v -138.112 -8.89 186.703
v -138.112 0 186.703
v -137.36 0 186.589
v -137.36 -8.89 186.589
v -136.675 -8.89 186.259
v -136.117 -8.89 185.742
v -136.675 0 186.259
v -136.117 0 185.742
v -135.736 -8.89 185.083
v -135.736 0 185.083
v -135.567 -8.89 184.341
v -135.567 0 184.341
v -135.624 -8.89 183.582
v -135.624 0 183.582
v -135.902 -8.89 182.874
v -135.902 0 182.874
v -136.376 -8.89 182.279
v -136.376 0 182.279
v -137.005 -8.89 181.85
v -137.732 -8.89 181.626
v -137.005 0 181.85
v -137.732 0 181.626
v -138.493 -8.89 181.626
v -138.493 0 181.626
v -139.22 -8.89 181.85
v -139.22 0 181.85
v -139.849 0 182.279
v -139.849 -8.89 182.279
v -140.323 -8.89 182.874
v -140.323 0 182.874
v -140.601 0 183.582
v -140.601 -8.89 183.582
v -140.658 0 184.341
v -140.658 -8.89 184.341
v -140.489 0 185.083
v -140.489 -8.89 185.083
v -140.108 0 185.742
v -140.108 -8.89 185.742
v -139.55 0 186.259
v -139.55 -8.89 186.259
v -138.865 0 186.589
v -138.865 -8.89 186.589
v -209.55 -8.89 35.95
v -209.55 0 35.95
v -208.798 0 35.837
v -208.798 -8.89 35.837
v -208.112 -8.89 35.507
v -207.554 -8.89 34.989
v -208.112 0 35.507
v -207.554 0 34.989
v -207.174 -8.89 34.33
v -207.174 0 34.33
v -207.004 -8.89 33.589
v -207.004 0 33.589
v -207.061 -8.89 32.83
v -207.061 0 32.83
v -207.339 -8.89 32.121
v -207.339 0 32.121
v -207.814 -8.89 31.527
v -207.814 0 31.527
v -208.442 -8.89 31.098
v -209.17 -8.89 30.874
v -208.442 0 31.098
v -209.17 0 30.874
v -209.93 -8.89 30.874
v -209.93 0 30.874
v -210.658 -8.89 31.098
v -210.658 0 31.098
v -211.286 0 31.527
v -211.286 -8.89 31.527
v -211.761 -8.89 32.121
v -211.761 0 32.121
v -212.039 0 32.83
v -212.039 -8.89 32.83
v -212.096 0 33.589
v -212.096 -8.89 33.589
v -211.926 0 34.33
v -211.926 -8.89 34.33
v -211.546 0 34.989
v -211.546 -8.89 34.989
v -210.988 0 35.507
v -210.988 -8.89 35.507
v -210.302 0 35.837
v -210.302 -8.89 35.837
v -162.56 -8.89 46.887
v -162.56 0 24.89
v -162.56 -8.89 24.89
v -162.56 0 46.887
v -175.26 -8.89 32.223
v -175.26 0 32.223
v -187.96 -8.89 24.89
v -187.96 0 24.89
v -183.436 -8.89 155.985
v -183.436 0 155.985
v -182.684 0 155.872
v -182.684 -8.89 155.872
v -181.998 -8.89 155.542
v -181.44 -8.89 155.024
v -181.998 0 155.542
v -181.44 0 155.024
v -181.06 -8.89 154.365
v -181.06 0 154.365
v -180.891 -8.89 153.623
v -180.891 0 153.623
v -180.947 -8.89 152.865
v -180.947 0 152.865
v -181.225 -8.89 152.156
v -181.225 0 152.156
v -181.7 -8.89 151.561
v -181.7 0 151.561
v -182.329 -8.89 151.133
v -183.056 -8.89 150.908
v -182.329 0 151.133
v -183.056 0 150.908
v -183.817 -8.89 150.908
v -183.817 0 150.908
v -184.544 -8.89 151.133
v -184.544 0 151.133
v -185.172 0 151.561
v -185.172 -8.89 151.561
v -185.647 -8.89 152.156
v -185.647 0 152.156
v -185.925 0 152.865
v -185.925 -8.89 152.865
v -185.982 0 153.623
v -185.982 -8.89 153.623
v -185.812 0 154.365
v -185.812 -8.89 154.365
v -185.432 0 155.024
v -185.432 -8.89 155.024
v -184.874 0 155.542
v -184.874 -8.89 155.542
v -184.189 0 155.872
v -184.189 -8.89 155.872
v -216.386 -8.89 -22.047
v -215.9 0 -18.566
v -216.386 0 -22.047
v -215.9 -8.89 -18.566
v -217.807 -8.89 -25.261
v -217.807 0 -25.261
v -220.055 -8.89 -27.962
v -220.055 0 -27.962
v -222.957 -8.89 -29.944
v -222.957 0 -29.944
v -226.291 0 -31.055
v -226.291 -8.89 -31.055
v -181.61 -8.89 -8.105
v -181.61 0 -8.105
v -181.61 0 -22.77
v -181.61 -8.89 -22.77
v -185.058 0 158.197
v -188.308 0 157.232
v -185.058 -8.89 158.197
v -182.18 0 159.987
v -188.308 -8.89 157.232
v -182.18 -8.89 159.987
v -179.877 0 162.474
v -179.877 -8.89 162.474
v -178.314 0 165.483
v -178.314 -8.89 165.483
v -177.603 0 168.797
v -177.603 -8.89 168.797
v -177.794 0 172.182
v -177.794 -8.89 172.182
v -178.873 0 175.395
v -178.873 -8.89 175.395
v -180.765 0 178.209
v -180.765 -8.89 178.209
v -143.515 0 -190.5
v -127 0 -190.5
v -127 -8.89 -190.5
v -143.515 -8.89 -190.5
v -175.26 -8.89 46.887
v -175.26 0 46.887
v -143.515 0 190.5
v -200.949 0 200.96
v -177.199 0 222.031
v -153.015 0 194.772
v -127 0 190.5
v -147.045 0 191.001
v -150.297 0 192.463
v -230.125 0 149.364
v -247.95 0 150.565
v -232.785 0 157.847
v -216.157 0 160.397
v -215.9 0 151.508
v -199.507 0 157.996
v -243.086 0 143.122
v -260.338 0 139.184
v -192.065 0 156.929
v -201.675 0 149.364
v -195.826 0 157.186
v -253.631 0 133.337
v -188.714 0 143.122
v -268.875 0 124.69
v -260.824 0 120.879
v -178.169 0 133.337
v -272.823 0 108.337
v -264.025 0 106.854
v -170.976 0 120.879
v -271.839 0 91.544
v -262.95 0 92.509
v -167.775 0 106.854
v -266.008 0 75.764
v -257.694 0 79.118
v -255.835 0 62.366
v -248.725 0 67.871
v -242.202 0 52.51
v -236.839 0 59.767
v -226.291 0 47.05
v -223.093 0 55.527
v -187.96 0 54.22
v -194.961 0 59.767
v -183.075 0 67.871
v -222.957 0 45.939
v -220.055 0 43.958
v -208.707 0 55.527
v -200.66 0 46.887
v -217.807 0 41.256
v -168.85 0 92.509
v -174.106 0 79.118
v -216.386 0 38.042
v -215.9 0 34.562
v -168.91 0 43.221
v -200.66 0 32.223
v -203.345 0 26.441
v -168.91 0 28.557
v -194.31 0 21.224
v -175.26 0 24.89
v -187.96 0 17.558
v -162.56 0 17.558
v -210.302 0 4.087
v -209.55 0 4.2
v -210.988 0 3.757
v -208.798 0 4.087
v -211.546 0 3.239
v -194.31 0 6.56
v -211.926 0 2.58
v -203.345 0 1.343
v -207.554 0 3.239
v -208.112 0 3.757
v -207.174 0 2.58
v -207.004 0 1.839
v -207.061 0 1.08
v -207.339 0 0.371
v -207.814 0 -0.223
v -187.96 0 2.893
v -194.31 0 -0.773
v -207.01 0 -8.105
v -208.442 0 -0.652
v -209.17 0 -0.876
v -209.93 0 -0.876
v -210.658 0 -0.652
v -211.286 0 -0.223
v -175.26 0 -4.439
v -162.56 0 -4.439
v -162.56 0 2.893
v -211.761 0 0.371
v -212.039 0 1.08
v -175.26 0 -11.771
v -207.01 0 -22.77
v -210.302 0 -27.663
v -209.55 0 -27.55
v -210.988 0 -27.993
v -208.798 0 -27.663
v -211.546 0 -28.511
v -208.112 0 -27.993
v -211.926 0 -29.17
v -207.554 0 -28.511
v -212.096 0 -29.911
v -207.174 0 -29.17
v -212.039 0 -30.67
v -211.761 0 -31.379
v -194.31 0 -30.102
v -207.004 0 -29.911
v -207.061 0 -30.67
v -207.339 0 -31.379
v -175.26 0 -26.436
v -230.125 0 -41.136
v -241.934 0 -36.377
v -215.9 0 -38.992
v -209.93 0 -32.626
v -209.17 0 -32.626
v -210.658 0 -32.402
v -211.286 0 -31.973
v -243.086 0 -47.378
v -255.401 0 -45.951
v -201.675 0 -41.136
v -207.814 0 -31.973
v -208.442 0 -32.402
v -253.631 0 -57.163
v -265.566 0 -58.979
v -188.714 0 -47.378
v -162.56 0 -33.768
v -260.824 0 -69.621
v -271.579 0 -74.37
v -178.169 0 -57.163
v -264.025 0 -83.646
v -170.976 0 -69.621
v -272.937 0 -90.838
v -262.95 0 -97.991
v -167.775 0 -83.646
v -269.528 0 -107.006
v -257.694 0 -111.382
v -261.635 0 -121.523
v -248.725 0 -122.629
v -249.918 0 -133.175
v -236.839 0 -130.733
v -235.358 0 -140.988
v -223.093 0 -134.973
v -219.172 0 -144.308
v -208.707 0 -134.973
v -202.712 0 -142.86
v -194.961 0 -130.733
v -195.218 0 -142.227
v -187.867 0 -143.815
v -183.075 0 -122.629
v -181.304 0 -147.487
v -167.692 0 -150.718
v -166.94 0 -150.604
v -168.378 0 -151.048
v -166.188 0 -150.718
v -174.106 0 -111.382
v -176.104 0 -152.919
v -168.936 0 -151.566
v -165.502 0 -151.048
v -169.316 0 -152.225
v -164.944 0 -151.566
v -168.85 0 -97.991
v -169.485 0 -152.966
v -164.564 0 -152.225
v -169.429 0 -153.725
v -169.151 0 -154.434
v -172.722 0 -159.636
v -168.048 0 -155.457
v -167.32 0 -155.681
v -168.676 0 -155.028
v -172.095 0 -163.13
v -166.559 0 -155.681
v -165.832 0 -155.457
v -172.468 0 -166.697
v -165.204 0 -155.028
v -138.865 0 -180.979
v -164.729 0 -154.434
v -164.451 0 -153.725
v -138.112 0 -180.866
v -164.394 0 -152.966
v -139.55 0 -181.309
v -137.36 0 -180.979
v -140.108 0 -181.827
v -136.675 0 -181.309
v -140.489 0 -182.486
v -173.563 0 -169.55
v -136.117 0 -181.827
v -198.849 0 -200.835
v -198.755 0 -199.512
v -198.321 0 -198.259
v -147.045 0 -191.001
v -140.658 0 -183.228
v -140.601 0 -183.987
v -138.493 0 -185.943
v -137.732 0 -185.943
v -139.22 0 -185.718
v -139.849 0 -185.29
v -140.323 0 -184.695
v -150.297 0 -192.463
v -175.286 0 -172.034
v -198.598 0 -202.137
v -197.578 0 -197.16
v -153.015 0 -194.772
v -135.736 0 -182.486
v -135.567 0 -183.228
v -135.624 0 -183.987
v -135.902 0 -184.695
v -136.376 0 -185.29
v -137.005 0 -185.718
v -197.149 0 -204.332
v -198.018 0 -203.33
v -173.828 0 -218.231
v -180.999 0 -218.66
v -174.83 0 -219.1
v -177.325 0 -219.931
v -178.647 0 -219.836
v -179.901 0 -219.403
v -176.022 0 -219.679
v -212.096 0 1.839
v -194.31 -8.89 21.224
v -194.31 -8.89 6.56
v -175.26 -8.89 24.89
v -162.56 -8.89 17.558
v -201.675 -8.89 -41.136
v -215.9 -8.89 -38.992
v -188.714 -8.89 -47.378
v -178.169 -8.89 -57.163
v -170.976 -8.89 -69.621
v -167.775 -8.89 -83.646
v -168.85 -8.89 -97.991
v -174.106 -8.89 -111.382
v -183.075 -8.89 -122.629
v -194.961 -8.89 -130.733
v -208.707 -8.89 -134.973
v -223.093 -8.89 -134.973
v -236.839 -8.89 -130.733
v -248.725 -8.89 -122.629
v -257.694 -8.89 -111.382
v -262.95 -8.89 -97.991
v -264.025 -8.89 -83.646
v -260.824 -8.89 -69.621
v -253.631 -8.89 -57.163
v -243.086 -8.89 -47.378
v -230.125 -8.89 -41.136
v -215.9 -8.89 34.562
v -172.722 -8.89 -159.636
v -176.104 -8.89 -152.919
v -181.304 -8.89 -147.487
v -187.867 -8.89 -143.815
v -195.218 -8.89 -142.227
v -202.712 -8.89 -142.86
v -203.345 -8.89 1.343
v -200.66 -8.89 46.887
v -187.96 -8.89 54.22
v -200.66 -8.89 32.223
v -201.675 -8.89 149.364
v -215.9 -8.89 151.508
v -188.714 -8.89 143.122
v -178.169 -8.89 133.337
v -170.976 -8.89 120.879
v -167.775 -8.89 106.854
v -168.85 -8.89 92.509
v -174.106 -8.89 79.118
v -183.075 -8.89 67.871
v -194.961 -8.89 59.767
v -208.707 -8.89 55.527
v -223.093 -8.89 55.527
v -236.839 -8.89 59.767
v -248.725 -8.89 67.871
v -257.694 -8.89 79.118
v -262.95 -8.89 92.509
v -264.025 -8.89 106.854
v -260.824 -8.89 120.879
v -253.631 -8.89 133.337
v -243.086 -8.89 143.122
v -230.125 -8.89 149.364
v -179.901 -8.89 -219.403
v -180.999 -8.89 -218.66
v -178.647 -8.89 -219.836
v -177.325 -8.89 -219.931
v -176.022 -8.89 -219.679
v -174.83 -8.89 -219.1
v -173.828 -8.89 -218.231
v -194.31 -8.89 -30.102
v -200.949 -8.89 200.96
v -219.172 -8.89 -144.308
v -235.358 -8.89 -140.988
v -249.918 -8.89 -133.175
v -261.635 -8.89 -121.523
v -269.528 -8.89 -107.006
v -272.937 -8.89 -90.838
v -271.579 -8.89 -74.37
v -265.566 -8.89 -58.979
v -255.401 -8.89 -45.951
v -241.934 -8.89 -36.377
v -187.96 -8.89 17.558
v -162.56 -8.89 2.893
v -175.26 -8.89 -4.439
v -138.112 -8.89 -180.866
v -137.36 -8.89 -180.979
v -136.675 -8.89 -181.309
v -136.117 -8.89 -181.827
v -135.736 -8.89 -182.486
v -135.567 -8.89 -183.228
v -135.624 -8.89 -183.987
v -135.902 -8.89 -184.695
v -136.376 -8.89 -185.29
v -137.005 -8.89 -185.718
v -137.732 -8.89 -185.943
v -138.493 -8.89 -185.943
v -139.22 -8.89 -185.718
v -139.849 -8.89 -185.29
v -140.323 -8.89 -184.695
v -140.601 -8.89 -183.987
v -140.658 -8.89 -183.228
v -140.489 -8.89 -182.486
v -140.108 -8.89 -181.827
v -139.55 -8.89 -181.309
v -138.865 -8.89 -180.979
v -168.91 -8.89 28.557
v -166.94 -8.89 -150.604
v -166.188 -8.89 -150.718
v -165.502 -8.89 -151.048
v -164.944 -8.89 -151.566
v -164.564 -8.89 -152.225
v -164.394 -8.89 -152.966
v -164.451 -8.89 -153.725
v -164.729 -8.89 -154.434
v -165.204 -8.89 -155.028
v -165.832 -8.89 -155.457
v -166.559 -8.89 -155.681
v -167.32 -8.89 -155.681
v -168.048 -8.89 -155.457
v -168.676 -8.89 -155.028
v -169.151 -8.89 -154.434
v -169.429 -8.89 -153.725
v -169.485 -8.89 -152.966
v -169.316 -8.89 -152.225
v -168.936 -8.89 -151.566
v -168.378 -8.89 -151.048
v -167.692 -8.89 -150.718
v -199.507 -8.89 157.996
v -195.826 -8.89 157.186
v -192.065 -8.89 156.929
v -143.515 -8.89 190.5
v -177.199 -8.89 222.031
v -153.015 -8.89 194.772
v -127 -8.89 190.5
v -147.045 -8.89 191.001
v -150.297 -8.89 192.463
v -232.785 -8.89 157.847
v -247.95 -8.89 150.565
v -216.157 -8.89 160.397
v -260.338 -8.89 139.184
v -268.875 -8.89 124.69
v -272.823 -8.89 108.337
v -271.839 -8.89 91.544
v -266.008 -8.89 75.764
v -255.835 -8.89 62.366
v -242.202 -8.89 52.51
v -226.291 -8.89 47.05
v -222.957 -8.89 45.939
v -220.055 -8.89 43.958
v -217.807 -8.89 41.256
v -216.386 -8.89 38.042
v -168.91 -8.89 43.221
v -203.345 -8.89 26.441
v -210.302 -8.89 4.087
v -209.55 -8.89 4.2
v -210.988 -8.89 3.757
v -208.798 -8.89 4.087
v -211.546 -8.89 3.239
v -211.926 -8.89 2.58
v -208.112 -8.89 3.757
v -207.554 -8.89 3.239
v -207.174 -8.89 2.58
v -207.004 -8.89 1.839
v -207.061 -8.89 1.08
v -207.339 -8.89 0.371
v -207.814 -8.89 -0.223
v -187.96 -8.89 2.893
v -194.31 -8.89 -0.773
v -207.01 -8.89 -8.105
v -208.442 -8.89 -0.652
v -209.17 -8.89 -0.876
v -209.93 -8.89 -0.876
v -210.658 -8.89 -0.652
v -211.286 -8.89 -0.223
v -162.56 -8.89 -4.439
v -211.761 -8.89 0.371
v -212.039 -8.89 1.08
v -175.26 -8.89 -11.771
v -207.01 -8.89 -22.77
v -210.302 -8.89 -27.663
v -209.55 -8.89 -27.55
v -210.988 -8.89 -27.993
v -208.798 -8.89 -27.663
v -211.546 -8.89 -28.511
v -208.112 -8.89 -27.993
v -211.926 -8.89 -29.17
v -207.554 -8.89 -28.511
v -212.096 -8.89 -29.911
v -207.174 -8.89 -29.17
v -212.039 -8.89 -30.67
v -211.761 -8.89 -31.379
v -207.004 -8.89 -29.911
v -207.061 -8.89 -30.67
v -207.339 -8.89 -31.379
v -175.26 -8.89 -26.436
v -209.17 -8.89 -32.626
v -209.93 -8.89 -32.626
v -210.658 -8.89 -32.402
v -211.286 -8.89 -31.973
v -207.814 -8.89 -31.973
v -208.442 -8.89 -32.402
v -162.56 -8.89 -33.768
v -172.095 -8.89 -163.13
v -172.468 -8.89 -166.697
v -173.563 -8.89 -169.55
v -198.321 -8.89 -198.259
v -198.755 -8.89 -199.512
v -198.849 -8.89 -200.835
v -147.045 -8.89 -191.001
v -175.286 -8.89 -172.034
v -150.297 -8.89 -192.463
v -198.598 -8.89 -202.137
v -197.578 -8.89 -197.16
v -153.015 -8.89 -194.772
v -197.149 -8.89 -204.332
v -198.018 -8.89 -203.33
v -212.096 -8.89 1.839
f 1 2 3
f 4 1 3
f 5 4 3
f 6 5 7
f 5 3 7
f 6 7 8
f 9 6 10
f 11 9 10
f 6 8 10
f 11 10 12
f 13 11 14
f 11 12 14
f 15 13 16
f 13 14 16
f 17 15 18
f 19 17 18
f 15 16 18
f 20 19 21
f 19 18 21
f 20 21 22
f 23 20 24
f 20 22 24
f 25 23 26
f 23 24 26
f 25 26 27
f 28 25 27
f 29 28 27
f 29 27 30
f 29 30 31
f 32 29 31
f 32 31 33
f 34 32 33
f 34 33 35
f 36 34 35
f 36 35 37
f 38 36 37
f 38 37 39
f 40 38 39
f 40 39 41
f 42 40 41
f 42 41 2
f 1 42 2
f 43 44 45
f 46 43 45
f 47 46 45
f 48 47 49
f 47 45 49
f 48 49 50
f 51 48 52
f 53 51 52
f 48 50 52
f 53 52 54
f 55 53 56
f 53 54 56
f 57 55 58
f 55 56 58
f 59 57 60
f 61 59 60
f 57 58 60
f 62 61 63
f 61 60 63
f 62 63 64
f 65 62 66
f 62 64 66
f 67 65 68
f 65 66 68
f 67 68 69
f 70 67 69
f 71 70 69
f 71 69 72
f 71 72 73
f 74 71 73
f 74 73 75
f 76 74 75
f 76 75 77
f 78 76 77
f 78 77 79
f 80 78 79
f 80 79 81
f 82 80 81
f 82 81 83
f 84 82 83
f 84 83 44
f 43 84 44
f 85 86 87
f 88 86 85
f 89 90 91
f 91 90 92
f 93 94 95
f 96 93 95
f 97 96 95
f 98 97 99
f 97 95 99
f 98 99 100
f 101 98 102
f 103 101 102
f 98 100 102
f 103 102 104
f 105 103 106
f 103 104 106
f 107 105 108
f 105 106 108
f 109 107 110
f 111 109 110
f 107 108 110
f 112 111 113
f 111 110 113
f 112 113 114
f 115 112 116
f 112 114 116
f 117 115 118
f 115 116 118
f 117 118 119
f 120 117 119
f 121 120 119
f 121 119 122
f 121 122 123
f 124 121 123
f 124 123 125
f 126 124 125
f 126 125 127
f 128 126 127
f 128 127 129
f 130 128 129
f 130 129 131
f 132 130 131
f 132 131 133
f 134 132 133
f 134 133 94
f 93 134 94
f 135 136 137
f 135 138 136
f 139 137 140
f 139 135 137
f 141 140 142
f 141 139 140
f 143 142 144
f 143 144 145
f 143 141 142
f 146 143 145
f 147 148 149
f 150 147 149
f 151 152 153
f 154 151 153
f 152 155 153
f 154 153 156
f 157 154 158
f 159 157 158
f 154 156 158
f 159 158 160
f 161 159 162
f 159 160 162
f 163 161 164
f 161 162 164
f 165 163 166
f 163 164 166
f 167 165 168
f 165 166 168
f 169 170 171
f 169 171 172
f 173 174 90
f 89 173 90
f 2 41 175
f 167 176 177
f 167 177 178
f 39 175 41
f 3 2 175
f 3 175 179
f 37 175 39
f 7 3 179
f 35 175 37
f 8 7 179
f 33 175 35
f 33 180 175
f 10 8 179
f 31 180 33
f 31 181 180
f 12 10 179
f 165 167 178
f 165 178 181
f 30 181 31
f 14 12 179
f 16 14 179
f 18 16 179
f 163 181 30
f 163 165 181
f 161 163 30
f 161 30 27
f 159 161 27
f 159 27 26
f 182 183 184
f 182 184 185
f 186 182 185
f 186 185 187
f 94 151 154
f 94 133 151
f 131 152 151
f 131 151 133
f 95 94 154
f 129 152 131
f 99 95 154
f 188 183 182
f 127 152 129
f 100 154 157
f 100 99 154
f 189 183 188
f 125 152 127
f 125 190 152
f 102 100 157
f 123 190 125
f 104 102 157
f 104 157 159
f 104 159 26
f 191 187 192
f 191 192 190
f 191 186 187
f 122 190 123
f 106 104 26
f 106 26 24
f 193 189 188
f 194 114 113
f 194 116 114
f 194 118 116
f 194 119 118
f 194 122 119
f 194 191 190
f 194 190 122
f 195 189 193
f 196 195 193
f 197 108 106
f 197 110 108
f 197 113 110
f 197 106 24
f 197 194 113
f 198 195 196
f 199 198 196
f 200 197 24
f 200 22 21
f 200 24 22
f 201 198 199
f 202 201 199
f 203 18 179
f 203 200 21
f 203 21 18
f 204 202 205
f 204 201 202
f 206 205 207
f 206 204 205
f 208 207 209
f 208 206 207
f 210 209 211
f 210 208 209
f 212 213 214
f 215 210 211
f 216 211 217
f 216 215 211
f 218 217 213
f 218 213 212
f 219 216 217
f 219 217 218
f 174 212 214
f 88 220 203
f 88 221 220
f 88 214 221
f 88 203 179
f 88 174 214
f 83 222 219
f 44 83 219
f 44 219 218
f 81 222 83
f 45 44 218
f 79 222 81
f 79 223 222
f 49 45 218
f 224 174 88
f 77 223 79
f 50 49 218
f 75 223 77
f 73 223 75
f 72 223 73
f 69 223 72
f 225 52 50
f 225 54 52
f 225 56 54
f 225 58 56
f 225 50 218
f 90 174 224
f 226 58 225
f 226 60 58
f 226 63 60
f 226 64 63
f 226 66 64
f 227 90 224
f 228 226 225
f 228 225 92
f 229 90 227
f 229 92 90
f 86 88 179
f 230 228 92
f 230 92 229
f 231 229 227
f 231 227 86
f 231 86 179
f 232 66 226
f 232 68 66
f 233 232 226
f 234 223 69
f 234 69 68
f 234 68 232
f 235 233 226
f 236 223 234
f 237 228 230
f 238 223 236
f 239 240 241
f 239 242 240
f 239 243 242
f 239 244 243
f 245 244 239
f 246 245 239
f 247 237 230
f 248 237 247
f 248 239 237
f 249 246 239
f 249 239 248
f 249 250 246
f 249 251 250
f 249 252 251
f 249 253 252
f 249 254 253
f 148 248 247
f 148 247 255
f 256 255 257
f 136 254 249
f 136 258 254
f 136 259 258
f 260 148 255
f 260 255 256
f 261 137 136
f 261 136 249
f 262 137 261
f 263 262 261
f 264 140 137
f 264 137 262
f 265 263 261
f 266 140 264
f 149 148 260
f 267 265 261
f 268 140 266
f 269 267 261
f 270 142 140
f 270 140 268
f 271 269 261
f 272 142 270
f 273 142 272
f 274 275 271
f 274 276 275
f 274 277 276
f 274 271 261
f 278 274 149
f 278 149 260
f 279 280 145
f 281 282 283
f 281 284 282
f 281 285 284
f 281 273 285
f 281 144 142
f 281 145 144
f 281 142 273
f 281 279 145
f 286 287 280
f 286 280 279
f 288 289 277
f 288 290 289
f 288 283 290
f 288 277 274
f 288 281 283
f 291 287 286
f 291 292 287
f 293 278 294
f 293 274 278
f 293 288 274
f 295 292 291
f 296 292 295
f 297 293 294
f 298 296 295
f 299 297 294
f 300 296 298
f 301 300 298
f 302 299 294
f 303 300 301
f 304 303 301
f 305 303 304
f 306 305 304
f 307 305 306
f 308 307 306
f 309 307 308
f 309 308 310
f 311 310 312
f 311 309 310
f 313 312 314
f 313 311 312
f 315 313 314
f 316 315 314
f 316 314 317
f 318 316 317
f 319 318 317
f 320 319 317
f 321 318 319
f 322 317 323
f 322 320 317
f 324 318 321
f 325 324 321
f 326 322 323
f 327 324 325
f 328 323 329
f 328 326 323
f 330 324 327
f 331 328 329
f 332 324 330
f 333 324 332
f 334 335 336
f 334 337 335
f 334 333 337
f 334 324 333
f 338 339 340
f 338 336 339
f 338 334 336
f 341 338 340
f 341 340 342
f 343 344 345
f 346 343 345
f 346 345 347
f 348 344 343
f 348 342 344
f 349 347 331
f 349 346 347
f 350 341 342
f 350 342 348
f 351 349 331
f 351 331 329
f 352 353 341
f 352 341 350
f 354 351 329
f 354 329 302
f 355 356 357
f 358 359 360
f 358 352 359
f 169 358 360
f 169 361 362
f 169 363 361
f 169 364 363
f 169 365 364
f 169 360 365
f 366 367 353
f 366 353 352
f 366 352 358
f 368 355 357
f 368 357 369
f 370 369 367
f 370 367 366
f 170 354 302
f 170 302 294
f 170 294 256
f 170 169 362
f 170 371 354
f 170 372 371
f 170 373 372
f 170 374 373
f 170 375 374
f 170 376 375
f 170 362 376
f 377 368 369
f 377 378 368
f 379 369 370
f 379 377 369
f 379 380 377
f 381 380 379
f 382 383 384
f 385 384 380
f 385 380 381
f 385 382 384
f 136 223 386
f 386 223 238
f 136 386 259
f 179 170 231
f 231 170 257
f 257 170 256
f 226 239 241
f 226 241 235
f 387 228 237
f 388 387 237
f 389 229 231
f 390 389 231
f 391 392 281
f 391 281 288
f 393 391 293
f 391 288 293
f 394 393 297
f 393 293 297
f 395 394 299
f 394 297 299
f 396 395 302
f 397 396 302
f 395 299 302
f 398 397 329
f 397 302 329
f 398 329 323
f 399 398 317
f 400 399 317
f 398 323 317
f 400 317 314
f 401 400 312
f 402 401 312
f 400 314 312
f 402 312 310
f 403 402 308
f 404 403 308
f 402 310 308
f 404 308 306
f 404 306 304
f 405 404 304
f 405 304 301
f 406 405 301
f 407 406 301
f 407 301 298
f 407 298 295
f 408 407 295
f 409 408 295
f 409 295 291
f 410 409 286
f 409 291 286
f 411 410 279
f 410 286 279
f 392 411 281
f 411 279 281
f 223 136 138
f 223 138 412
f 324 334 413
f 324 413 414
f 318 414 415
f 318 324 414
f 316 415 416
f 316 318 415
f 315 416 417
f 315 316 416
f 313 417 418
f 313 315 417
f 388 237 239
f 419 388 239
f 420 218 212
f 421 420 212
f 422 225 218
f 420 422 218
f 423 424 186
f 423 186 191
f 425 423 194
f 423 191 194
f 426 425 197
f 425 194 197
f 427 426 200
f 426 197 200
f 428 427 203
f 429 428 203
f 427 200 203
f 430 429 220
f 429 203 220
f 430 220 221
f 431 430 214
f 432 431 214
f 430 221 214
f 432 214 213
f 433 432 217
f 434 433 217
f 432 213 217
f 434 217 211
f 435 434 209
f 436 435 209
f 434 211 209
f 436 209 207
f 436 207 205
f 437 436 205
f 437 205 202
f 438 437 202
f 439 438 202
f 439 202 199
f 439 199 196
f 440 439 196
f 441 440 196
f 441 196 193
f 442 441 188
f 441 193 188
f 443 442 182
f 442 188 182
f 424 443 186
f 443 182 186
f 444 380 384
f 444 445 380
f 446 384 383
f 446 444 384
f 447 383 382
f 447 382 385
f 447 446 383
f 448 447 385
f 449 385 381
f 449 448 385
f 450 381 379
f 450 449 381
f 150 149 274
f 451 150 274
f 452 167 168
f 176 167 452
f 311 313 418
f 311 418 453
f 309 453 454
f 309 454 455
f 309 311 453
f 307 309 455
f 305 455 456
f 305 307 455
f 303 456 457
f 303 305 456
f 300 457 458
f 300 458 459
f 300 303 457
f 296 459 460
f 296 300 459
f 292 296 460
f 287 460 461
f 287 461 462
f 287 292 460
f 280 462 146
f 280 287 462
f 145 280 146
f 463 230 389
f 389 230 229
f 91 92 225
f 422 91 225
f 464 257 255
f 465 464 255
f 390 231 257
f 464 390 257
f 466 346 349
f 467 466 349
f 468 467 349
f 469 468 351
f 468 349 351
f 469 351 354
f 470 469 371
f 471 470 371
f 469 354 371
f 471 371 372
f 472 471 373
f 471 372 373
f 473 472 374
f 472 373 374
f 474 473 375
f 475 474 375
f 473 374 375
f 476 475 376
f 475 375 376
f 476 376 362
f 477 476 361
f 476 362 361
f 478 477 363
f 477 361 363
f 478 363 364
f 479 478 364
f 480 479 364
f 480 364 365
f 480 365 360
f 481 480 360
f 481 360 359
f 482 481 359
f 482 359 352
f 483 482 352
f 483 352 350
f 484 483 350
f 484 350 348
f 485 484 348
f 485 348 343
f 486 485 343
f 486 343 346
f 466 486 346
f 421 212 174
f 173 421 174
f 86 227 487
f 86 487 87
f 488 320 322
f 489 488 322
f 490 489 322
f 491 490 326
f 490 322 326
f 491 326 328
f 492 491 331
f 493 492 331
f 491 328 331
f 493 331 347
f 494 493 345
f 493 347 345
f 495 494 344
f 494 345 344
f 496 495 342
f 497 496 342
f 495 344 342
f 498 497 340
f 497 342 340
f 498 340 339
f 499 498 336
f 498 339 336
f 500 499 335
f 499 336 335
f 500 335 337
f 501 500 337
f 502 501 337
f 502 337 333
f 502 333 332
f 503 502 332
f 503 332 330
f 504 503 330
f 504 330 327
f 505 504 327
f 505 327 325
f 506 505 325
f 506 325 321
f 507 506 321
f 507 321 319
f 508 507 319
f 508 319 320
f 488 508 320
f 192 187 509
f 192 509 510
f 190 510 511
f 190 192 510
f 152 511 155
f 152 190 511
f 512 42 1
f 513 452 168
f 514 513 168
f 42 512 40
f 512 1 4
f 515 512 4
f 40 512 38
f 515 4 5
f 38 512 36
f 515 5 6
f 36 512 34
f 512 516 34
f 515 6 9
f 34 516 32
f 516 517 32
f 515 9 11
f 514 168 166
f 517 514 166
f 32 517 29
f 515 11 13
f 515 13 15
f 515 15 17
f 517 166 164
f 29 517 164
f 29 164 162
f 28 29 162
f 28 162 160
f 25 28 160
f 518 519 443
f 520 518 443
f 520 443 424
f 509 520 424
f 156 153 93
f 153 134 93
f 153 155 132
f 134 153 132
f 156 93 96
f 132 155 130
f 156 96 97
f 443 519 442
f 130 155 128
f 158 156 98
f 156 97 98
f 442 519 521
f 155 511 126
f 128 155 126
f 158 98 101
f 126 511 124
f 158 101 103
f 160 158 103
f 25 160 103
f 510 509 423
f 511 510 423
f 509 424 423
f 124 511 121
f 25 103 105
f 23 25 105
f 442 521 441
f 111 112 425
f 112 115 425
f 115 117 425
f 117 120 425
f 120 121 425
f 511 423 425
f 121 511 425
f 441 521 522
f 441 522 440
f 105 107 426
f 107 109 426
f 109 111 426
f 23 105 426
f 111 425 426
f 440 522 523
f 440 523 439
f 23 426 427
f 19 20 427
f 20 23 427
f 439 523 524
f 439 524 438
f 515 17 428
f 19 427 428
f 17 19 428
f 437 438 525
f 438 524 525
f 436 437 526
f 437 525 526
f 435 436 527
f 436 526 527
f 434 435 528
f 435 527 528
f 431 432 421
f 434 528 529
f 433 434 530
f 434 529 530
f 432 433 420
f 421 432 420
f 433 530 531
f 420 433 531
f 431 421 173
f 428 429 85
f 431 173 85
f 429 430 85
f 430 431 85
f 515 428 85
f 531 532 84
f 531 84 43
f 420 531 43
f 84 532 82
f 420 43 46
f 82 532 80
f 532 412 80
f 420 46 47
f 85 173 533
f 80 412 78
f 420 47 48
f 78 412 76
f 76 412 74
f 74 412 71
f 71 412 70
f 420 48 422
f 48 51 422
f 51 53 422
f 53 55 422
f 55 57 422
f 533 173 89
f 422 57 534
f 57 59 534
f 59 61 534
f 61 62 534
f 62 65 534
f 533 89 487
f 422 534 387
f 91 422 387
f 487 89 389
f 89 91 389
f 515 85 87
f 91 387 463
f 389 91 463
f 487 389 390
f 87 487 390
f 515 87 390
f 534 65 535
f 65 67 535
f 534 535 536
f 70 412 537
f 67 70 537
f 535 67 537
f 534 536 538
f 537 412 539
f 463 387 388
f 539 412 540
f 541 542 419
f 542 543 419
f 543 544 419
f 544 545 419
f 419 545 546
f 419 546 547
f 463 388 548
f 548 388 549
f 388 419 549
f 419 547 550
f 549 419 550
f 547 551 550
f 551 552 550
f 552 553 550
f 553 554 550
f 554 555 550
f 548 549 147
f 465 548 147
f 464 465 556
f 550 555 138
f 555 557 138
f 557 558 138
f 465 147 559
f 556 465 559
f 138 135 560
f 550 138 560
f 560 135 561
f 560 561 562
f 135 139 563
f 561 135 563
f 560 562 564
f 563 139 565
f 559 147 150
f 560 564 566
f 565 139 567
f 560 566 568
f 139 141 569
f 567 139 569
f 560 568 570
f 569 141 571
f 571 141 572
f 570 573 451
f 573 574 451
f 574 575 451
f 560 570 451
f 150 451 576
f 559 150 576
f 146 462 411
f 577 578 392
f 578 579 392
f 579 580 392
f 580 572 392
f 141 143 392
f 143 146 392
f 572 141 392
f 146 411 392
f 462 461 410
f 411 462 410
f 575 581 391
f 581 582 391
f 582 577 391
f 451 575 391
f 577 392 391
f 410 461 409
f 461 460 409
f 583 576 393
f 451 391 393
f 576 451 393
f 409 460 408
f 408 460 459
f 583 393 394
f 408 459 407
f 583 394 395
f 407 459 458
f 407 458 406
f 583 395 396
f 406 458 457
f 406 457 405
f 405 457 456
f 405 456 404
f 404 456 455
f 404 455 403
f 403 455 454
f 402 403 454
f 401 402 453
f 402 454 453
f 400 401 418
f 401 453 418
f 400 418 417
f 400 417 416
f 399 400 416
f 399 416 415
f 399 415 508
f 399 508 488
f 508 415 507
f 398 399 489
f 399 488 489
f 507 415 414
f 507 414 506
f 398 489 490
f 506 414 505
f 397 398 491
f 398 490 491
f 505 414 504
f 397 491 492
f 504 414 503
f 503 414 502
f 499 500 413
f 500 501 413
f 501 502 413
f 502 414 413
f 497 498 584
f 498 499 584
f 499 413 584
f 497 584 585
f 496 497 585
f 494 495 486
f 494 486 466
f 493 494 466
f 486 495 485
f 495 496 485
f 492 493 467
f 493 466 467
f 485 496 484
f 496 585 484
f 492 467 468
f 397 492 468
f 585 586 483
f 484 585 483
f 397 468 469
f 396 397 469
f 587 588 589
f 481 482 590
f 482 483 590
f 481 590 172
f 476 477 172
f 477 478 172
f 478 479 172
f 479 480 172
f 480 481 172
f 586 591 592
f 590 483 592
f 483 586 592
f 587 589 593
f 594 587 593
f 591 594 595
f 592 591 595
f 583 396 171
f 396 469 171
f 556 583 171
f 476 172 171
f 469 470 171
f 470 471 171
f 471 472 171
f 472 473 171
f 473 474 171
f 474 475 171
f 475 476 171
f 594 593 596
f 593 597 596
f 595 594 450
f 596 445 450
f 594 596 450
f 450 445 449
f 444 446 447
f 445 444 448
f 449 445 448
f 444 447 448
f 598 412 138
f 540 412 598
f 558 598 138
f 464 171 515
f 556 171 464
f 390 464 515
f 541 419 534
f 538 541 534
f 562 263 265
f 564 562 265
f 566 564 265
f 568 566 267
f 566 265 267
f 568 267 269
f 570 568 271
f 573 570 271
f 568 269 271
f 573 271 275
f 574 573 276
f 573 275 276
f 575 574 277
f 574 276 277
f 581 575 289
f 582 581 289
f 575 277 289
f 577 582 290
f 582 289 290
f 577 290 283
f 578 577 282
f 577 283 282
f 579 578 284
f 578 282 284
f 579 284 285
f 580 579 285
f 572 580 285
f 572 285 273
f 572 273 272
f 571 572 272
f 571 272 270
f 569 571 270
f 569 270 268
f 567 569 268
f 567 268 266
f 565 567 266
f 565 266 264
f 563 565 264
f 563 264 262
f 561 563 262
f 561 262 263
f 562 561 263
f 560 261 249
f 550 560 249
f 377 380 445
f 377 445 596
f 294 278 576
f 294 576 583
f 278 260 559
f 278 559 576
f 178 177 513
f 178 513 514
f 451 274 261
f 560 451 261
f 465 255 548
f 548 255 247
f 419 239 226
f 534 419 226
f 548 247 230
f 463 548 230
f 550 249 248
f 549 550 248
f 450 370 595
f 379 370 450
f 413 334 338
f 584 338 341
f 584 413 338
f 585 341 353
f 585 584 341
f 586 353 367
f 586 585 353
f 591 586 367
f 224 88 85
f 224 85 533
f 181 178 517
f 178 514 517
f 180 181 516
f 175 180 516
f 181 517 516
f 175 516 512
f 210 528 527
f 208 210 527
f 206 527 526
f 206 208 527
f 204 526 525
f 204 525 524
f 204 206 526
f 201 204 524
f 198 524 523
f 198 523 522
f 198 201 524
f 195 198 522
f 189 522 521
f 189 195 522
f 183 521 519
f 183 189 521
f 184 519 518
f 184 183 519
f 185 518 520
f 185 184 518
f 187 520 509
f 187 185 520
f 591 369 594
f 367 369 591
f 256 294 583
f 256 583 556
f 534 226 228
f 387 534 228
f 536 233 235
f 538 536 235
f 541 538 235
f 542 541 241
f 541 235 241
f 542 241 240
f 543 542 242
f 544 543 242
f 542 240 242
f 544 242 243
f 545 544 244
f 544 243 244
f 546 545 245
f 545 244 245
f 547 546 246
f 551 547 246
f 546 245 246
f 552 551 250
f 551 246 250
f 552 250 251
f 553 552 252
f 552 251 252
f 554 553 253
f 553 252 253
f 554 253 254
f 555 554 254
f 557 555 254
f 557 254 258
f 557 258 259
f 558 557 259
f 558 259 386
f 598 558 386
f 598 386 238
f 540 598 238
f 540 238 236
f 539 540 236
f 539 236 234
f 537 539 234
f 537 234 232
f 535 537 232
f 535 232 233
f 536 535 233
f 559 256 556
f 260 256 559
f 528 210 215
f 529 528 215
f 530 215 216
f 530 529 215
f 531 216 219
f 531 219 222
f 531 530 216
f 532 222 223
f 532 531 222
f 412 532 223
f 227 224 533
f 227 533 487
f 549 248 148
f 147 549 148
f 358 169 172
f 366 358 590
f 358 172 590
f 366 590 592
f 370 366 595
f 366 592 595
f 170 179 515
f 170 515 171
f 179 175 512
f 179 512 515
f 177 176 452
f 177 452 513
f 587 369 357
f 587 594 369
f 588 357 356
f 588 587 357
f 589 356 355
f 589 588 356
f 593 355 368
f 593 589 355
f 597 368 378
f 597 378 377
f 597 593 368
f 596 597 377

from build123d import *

# Parameters (mm, degrees)
SKETCH5_R           = 48.26
BOSS_EXTRUDE1_DEPTH = 8.89
FILLET1_R           = 25.4
SKETCH9_R           = 2.5527
CUT_EXTRUDE1_DEPTH  = 12.7
FILLET3_R           = 12.7
FILLET4_R           = 12.7
FILLET5_R           = 5.08


with BuildPart() as part:
    # Sketch5 → Boss-Extrude1 (new body)
    with BuildSketch(Plane(origin=(0, 0, 0), x_dir=(1, 0, 0), z_dir=(0, 1, 0))):
        with BuildLine():
            ThreePointArc((-215.9, -46.097790831), (-267.470384182, -127.877406649), (-171.45, -139.168815315))
            Line((-171.45, -139.168815315), (-171.45, -167.709773326))
            Line((-171.45, -167.709773326), (-200.949318136, -200.960227902))
            Line((-200.949318136, -200.960227902), (-177.198993439, -222.031169428))
            Line((-177.198993439, -222.031169428), (-149.225, -190.5))
            Line((-149.225, -190.5), (-127, -190.5))
            Line((-127, -190.5), (-127, 190.5))
            Line((-127, 190.5), (-149.225, 190.5))
            Line((-149.225, 190.5), (-177.198993439, 222.031169428))
            Line((-177.198993439, 222.031169428), (-200.949318136, 200.960227902))
            Line((-200.949318136, 200.960227902), (-171.45, 167.709773326))
            Line((-171.45, 167.709773326), (-171.45, 123.173233653))
            ThreePointArc((-171.45, 123.173233653), (-267.470384182, 111.881824988), (-215.9, 30.102209169))
            Line((-215.9, 30.102209169), (-215.9, -46.097790831))
        make_face()
        with Locations(Location((-215.9, -103.247790831, 0), (0, 0, 270))):
            Circle(SKETCH5_R, mode=Mode.SUBTRACT)
        with Locations(Location((-215.9, 87.252209169, 0), (0, 0, 270))):
            Circle(SKETCH5_R, mode=Mode.SUBTRACT)
    extrude(amount=-BOSS_EXTRUDE1_DEPTH)

    # Fillet1
    # the kernel refuses this fillet: 25.4 mm, written as the material it adds along each edge
    with BuildSketch(Plane(origin=(-171.45, 0, -123.173233653), x_dir=(0, 0, -1), z_dir=(0, -1, 0))) as fillet1_piece_1:
        with BuildLine():
            CenterArc((44.400828084, -25.4), FILLET1_R, 90, 103.342363797)
            Line((19.686411909, -31.261538462), (19.192123586, -31.378769231))
            ThreePointArc((19.192123586, -31.378769231), (12.009069237, -14.266854375), (-0.319297995, -0.395111111))
            Line((-0.319297995, -0.395111111), (0, 0.508))
            Line((0, 0.508), (44.400828084, 0.508))
            Line((44.400828084, 0.508), (44.400828084, 0))
        make_face()
    extrude(amount=8.89)
    with BuildSketch(Plane(origin=(-171.45, 0, 139.168815315), x_dir=(-0.8303696180979097, 0, 0.557212973054228), z_dir=(0, -1, 0))) as fillet1_piece_2:
        with BuildLine():
            CenterArc((41.297101209, -24.264819571), FILLET1_R, 107.194284187, 71.530497093)
            Line((15.903392067, -23.699544404), (15.395517884, -23.6882389))
            ThreePointArc((15.395517884, -23.6882389), (7.529868268, -12.132836392), (-0.421827766, -0.28306419))
            Line((-0.421827766, -0.28306419), (0.150171277, 0.485296391))
            ThreePointArc((0.150171277, 0.485296391), (16.894268676, -2.046155965), (33.638366076, 0.485296391))
            Line((33.638366076, 0.485296391), (33.788537353, 0))
        make_face()
    extrude(amount=8.89)

    # Sketch9 → Cut-Extrude1 (cut)
    with BuildSketch(Plane(origin=(0, 0, 0), x_dir=(1, 0, 0), z_dir=(0, 1, 0))):
        Polygon((-181.61, 8.105163913), (-181.61, 22.76986075), (-194.31, 30.102209169), (-207.01, 22.76986075), (-207.01, 8.105163913), (-194.31, 0.772815494), align=None)
        Polygon((-175.26, -46.887449227), (-175.26, -32.22275239), (-187.96, -24.890403971), (-200.66, -32.22275239), (-200.66, -46.887449227), (-187.96, -54.219797646), align=None)
        Polygon((-175.26, -24.890403971), (-162.56, -17.558055552), (-162.56, -2.893358715), (-175.26, 4.438989704), (-187.96, -2.893358715), (-187.96, -17.558055552), align=None)
        Polygon((-194.31, -6.559532924), (-203.345054514, -1.343141768), (-203.345054514, -26.440620918), (-194.31, -21.224229762), align=None)
        Polygon((-162.56, 33.768383379), (-162.56, 4.438989704), (-175.26, 11.771338122), (-175.26, 26.43603496), align=None)
        Polygon((-162.56, -24.890403971), (-162.56, -46.887449227), (-168.91, -43.221275018), (-168.91, -28.55657818), align=None)
        with Locations(Location((-183.436118723, -153.432579675, 0), (0, 0, 270))):
            Circle(SKETCH9_R)
        with Locations(Location((-138.1125, 183.418546383, 0), (0, 0, 270))):
            Circle(SKETCH9_R)
        with Locations(Location((-138.1125, -184.15, 0), (0, 0, 270))):
            Circle(SKETCH9_R)
        with Locations(Location((-166.939936911, 153.157179019, 0), (0, 0, 270))):
            Circle(SKETCH9_R)
        with Locations(Location((-209.55, -1.647790831, 0), (0, 0, 270))):
            Circle(SKETCH9_R)
        with Locations(Location((-209.55, -33.397790831, 0), (0, 0, 270))):
            Circle(SKETCH9_R)
        with Locations(Location((-209.55, 30.102209169, 0), (0, 0, 270))):
            Circle(SKETCH9_R)
    extrude(amount=-CUT_EXTRUDE1_DEPTH, mode=Mode.SUBTRACT)

    # Fillet3
    fillet3_edges = [part.edges().sort_by_distance(p)[0] for p in [
        (-149.225, -4.445, -190.5),
        (-171.45, -4.445, -167.709773326),
        (-171.45, -4.445, 167.709773326),
        (-149.225, -4.445, 190.5),
    ]]
    fillet(fillet3_edges, radius=FILLET3_R)

    # Fillet4
    fillet4_edges = [part.edges().sort_by_distance(p)[0] for p in [
        (-215.9, -4.445, 46.097790831),
        (-215.9, -4.445, -30.102209169),
    ]]
    fillet(fillet4_edges, radius=FILLET4_R)

    # Fillet5
    fillet5_edges = [part.edges().sort_by_distance(p)[0] for p in [
        (-200.949318136, -4.445, -200.960227902),
        (-177.198993439, -4.445, -222.031169428),
    ]]
    fillet(fillet5_edges, radius=FILLET5_R)


solid = part.part
